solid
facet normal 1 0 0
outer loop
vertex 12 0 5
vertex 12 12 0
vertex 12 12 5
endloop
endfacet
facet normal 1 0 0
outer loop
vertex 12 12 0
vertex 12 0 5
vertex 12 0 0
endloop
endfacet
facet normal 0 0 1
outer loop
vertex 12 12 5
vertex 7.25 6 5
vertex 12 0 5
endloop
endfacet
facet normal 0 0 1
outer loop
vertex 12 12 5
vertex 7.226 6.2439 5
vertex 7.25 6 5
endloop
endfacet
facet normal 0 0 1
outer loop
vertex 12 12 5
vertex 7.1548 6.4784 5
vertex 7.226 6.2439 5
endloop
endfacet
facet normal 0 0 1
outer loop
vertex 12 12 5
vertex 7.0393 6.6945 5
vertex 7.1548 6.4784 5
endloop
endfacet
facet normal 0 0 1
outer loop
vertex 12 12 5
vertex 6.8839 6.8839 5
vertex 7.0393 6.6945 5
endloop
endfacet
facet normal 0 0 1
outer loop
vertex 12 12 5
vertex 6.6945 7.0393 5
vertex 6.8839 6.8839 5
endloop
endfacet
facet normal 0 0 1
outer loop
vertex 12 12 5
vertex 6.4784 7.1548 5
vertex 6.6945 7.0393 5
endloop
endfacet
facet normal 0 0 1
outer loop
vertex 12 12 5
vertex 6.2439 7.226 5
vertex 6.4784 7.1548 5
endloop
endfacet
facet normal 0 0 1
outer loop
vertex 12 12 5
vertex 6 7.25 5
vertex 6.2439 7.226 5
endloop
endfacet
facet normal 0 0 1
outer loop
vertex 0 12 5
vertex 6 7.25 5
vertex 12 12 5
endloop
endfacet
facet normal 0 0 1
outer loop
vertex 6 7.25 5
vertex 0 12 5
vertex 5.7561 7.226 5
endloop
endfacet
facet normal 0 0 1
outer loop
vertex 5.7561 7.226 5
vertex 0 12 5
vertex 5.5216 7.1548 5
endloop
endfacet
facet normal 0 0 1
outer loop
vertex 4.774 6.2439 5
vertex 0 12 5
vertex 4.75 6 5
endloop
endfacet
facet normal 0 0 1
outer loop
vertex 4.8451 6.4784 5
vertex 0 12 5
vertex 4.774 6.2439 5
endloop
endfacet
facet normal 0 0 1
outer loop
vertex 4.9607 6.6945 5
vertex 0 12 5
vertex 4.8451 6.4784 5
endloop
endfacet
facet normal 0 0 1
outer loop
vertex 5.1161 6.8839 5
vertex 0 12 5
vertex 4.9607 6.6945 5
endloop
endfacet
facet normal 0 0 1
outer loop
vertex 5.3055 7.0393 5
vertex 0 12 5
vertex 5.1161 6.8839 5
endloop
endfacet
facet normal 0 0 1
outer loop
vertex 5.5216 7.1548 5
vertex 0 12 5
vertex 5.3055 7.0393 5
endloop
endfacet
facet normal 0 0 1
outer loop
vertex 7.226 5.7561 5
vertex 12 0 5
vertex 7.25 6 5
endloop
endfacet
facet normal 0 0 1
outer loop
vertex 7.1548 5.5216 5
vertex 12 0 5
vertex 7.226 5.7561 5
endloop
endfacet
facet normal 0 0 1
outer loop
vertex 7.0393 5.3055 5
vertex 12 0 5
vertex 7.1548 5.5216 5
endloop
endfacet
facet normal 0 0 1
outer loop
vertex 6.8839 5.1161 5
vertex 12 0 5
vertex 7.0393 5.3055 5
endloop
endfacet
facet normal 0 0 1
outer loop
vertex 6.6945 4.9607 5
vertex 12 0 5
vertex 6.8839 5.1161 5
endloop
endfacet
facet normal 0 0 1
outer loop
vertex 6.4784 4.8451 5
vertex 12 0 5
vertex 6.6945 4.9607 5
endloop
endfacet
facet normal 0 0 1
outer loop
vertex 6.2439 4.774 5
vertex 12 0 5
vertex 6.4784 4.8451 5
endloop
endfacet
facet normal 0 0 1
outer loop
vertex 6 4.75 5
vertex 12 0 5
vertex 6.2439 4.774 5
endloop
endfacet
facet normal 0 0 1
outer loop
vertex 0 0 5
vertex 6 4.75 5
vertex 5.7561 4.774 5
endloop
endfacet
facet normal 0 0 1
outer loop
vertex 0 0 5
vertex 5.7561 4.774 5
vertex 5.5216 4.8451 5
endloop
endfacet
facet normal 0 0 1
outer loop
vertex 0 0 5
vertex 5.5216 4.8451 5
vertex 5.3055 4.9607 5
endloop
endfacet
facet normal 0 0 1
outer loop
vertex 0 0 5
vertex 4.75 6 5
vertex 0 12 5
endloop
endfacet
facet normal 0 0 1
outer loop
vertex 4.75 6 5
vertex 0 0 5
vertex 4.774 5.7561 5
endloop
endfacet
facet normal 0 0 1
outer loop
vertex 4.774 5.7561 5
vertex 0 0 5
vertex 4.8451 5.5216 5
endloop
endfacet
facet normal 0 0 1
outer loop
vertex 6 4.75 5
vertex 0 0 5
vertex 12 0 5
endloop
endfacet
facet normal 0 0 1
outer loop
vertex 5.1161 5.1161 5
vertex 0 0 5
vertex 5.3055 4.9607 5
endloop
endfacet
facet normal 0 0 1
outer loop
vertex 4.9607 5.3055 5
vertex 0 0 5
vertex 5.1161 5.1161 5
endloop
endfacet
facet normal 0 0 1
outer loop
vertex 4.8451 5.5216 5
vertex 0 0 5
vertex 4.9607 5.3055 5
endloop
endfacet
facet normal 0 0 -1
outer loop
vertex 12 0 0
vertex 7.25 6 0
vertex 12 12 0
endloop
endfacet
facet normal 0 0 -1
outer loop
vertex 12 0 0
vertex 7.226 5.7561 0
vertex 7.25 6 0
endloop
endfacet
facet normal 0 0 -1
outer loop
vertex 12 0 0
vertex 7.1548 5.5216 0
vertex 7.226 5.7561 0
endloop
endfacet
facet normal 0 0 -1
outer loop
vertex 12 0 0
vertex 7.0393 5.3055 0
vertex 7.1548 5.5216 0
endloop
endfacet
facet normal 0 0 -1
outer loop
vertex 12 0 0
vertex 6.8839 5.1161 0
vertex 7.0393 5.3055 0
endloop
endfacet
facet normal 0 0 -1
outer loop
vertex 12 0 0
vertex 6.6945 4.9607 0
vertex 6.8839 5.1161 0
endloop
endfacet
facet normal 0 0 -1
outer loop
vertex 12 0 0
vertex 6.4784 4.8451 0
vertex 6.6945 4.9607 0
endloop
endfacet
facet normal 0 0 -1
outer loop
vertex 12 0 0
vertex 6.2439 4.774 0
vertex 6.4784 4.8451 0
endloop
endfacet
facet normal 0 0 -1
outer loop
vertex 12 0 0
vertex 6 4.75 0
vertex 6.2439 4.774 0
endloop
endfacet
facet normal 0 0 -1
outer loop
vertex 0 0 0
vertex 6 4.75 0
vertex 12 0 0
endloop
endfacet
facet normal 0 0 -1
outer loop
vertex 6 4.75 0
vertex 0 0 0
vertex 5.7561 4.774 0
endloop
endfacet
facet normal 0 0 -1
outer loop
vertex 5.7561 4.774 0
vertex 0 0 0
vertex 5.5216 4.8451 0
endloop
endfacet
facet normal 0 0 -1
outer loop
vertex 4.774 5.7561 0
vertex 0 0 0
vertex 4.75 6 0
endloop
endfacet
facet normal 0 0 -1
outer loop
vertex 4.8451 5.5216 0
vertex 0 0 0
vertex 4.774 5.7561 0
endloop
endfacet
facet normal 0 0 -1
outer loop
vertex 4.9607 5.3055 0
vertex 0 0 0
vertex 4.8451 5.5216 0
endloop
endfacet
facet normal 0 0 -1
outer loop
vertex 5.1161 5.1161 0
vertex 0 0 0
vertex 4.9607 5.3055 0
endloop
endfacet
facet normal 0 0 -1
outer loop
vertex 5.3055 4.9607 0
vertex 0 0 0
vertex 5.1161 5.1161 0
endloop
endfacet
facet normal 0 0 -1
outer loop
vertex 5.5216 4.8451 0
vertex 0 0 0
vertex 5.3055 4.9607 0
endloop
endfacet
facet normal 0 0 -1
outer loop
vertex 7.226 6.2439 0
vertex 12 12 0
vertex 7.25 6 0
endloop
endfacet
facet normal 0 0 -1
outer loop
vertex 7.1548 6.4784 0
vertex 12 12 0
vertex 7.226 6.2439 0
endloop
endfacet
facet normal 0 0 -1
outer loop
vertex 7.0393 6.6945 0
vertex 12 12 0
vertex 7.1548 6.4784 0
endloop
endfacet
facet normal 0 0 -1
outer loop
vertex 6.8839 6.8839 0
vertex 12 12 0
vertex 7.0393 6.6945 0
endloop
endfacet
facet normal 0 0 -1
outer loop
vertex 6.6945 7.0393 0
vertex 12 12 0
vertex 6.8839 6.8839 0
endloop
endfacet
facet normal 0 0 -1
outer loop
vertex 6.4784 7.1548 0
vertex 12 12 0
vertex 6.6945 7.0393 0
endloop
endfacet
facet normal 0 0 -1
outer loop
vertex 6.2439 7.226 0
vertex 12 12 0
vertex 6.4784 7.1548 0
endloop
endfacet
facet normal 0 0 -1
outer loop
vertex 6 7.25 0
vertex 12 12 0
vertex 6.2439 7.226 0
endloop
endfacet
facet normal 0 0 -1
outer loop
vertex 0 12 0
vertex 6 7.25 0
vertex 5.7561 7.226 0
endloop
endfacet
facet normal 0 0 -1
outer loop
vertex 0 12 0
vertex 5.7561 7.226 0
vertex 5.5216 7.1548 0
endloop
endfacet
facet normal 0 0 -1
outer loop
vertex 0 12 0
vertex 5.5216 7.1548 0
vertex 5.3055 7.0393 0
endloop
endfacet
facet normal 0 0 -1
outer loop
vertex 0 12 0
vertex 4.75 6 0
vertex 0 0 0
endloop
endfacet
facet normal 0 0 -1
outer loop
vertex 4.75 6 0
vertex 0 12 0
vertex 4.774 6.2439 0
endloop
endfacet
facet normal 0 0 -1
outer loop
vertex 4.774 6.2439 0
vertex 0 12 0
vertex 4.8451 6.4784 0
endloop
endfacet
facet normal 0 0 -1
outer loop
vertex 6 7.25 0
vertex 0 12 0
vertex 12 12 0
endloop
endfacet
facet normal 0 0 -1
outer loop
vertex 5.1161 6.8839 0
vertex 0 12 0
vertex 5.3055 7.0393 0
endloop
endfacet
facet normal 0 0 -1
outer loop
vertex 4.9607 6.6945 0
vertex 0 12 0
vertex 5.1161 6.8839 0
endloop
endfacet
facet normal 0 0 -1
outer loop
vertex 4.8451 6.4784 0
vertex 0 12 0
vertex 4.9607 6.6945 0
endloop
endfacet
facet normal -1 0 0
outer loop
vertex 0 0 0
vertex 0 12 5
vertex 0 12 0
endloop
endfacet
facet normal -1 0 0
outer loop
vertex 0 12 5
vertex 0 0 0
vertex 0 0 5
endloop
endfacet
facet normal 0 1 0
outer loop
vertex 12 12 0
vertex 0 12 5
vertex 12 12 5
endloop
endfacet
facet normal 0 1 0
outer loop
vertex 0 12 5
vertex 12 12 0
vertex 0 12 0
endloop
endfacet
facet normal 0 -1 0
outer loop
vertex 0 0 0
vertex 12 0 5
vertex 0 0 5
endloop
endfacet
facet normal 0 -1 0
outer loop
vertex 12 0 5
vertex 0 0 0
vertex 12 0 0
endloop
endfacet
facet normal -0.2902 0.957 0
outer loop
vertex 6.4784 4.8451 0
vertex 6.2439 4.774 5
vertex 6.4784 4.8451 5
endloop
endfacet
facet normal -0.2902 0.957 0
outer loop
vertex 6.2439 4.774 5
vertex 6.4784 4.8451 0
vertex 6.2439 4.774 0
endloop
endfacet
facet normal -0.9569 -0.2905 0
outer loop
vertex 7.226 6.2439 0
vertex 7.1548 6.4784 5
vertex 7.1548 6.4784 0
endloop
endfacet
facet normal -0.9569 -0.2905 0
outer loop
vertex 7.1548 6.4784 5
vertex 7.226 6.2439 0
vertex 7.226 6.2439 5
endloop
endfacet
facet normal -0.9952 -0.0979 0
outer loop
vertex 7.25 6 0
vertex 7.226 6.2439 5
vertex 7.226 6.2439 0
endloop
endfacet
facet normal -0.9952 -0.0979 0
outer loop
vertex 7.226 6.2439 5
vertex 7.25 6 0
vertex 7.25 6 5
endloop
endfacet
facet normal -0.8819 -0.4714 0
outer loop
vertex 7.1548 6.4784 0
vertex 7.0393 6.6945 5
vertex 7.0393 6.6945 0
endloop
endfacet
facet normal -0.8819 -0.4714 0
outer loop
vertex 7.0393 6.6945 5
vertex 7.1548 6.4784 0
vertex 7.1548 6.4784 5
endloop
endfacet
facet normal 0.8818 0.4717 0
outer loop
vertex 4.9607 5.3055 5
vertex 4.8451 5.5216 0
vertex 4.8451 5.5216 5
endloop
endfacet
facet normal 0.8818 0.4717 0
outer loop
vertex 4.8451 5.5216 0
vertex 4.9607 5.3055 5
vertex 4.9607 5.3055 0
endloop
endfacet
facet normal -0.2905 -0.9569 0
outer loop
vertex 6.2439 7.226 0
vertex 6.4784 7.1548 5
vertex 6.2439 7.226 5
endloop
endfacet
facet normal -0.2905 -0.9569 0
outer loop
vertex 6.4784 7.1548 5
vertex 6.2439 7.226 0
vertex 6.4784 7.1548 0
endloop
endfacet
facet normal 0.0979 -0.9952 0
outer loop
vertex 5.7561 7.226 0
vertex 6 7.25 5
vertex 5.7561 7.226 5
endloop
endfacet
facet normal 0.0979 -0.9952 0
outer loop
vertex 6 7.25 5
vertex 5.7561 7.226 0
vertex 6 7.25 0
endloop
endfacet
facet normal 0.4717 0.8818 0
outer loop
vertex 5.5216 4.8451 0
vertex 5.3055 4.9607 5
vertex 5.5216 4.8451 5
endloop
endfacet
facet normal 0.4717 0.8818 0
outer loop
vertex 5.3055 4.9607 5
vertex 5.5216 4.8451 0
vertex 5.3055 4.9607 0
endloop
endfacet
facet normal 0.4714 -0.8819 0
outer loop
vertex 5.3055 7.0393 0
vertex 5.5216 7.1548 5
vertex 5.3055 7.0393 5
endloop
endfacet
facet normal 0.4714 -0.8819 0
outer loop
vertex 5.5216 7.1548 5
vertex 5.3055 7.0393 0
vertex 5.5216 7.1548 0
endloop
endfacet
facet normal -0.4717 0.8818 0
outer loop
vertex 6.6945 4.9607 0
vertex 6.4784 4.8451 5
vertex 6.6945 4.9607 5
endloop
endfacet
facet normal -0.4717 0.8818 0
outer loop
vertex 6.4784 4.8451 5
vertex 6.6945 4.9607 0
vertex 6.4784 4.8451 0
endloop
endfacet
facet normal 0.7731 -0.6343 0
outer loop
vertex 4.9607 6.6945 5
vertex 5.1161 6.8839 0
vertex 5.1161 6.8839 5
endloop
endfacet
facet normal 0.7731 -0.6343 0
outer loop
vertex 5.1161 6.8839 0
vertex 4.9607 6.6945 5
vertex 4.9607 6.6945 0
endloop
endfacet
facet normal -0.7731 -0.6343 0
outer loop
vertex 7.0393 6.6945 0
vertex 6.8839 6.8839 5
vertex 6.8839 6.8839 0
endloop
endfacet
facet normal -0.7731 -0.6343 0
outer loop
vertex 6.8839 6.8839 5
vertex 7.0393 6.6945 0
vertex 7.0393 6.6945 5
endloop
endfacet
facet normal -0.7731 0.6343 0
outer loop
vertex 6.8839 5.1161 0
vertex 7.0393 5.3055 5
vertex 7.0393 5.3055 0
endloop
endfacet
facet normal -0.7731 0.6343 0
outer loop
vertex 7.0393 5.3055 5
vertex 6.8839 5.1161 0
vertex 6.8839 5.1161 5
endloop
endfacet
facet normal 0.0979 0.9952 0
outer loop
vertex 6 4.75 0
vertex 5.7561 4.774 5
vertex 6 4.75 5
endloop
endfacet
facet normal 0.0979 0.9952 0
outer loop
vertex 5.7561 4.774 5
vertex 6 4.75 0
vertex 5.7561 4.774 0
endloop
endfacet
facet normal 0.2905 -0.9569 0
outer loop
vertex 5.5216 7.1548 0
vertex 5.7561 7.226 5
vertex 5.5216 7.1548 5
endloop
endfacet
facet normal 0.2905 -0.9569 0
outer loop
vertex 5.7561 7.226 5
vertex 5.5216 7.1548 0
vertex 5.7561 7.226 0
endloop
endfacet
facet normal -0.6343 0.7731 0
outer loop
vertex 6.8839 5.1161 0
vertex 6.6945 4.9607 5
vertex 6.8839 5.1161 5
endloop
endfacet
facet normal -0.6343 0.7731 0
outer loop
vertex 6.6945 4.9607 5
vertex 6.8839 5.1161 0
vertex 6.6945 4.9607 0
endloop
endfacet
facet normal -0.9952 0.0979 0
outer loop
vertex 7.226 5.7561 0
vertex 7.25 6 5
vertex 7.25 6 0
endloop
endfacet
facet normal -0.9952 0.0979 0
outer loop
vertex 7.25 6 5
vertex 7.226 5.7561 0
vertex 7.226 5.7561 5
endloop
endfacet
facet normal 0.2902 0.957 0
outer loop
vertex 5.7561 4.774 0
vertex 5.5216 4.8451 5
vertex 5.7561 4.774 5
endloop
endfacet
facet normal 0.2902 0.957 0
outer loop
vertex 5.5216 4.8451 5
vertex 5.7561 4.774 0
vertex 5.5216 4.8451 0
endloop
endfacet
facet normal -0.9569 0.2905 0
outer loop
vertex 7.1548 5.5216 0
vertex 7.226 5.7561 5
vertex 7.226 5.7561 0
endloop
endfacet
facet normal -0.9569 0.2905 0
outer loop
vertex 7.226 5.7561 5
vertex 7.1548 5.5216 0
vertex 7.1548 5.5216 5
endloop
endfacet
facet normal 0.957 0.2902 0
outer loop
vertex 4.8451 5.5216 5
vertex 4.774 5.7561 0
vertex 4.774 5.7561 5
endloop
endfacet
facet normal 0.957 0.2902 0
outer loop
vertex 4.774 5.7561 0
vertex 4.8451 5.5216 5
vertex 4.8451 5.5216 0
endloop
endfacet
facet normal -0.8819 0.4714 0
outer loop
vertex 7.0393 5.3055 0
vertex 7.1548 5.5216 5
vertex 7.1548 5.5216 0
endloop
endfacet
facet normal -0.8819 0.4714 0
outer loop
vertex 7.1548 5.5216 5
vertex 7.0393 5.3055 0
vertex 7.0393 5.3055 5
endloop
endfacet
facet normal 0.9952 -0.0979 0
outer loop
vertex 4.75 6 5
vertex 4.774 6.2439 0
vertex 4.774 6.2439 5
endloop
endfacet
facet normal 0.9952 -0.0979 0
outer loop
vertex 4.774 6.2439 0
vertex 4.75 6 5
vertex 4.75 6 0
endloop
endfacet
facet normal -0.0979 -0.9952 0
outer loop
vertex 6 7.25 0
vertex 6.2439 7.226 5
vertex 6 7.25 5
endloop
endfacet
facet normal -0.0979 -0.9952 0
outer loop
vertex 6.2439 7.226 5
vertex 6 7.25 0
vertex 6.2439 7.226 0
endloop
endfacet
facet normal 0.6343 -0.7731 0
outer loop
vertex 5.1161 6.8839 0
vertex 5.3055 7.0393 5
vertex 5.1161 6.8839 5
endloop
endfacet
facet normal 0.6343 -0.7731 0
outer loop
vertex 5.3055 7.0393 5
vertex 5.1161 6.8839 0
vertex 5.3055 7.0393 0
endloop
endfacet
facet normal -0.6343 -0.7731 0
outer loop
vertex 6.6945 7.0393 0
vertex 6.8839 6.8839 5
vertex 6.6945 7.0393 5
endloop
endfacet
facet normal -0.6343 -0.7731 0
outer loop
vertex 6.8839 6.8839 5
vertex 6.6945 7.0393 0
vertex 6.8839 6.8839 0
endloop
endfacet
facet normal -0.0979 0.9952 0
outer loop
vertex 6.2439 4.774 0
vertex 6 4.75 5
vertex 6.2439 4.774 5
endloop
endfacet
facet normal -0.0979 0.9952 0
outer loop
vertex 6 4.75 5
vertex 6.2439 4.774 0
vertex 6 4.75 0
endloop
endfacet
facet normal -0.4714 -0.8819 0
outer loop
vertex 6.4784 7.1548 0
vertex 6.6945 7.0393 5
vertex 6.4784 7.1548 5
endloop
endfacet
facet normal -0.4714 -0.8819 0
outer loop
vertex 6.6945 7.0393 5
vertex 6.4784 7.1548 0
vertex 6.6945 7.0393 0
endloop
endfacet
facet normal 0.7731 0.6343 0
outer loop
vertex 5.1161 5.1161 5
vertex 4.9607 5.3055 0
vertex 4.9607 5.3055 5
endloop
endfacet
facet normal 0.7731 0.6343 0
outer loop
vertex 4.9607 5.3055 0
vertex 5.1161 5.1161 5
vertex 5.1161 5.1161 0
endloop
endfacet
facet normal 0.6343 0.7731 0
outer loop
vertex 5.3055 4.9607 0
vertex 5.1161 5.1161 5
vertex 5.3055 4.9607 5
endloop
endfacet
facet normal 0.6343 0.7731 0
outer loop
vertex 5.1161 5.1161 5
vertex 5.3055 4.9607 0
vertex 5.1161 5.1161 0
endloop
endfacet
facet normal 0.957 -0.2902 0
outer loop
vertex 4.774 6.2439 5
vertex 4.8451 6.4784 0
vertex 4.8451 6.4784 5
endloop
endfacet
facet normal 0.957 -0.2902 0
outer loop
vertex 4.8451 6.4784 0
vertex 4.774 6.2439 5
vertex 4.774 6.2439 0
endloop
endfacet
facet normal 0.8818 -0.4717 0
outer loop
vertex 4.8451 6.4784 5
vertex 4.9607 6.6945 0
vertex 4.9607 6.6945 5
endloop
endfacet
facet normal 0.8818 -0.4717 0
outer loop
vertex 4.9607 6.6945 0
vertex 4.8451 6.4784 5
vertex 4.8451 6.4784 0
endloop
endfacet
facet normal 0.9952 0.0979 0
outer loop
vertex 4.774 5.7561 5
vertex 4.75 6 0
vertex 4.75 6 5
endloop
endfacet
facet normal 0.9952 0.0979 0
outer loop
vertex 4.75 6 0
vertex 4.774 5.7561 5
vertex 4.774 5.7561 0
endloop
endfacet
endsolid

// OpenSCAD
$fn = 32;

// ----------------------------------------------------------------------
// Micro pad: drilled pad, 5-20 mm class
// ----------------------------------------------------------------------

// --- parameters (mm) ---
pad_l = 12;               // pad length, X
pad_w = 12;               // pad width, Y
pad_t = 5;                // pad thickness, Z
hole_d = 2.5;             // through hole diameter

difference() {
  cube([pad_l, pad_w, pad_t]);
  translate([pad_l / 2, pad_w / 2, -1])
    cylinder(h = pad_t + 2, d = hole_d);
}
